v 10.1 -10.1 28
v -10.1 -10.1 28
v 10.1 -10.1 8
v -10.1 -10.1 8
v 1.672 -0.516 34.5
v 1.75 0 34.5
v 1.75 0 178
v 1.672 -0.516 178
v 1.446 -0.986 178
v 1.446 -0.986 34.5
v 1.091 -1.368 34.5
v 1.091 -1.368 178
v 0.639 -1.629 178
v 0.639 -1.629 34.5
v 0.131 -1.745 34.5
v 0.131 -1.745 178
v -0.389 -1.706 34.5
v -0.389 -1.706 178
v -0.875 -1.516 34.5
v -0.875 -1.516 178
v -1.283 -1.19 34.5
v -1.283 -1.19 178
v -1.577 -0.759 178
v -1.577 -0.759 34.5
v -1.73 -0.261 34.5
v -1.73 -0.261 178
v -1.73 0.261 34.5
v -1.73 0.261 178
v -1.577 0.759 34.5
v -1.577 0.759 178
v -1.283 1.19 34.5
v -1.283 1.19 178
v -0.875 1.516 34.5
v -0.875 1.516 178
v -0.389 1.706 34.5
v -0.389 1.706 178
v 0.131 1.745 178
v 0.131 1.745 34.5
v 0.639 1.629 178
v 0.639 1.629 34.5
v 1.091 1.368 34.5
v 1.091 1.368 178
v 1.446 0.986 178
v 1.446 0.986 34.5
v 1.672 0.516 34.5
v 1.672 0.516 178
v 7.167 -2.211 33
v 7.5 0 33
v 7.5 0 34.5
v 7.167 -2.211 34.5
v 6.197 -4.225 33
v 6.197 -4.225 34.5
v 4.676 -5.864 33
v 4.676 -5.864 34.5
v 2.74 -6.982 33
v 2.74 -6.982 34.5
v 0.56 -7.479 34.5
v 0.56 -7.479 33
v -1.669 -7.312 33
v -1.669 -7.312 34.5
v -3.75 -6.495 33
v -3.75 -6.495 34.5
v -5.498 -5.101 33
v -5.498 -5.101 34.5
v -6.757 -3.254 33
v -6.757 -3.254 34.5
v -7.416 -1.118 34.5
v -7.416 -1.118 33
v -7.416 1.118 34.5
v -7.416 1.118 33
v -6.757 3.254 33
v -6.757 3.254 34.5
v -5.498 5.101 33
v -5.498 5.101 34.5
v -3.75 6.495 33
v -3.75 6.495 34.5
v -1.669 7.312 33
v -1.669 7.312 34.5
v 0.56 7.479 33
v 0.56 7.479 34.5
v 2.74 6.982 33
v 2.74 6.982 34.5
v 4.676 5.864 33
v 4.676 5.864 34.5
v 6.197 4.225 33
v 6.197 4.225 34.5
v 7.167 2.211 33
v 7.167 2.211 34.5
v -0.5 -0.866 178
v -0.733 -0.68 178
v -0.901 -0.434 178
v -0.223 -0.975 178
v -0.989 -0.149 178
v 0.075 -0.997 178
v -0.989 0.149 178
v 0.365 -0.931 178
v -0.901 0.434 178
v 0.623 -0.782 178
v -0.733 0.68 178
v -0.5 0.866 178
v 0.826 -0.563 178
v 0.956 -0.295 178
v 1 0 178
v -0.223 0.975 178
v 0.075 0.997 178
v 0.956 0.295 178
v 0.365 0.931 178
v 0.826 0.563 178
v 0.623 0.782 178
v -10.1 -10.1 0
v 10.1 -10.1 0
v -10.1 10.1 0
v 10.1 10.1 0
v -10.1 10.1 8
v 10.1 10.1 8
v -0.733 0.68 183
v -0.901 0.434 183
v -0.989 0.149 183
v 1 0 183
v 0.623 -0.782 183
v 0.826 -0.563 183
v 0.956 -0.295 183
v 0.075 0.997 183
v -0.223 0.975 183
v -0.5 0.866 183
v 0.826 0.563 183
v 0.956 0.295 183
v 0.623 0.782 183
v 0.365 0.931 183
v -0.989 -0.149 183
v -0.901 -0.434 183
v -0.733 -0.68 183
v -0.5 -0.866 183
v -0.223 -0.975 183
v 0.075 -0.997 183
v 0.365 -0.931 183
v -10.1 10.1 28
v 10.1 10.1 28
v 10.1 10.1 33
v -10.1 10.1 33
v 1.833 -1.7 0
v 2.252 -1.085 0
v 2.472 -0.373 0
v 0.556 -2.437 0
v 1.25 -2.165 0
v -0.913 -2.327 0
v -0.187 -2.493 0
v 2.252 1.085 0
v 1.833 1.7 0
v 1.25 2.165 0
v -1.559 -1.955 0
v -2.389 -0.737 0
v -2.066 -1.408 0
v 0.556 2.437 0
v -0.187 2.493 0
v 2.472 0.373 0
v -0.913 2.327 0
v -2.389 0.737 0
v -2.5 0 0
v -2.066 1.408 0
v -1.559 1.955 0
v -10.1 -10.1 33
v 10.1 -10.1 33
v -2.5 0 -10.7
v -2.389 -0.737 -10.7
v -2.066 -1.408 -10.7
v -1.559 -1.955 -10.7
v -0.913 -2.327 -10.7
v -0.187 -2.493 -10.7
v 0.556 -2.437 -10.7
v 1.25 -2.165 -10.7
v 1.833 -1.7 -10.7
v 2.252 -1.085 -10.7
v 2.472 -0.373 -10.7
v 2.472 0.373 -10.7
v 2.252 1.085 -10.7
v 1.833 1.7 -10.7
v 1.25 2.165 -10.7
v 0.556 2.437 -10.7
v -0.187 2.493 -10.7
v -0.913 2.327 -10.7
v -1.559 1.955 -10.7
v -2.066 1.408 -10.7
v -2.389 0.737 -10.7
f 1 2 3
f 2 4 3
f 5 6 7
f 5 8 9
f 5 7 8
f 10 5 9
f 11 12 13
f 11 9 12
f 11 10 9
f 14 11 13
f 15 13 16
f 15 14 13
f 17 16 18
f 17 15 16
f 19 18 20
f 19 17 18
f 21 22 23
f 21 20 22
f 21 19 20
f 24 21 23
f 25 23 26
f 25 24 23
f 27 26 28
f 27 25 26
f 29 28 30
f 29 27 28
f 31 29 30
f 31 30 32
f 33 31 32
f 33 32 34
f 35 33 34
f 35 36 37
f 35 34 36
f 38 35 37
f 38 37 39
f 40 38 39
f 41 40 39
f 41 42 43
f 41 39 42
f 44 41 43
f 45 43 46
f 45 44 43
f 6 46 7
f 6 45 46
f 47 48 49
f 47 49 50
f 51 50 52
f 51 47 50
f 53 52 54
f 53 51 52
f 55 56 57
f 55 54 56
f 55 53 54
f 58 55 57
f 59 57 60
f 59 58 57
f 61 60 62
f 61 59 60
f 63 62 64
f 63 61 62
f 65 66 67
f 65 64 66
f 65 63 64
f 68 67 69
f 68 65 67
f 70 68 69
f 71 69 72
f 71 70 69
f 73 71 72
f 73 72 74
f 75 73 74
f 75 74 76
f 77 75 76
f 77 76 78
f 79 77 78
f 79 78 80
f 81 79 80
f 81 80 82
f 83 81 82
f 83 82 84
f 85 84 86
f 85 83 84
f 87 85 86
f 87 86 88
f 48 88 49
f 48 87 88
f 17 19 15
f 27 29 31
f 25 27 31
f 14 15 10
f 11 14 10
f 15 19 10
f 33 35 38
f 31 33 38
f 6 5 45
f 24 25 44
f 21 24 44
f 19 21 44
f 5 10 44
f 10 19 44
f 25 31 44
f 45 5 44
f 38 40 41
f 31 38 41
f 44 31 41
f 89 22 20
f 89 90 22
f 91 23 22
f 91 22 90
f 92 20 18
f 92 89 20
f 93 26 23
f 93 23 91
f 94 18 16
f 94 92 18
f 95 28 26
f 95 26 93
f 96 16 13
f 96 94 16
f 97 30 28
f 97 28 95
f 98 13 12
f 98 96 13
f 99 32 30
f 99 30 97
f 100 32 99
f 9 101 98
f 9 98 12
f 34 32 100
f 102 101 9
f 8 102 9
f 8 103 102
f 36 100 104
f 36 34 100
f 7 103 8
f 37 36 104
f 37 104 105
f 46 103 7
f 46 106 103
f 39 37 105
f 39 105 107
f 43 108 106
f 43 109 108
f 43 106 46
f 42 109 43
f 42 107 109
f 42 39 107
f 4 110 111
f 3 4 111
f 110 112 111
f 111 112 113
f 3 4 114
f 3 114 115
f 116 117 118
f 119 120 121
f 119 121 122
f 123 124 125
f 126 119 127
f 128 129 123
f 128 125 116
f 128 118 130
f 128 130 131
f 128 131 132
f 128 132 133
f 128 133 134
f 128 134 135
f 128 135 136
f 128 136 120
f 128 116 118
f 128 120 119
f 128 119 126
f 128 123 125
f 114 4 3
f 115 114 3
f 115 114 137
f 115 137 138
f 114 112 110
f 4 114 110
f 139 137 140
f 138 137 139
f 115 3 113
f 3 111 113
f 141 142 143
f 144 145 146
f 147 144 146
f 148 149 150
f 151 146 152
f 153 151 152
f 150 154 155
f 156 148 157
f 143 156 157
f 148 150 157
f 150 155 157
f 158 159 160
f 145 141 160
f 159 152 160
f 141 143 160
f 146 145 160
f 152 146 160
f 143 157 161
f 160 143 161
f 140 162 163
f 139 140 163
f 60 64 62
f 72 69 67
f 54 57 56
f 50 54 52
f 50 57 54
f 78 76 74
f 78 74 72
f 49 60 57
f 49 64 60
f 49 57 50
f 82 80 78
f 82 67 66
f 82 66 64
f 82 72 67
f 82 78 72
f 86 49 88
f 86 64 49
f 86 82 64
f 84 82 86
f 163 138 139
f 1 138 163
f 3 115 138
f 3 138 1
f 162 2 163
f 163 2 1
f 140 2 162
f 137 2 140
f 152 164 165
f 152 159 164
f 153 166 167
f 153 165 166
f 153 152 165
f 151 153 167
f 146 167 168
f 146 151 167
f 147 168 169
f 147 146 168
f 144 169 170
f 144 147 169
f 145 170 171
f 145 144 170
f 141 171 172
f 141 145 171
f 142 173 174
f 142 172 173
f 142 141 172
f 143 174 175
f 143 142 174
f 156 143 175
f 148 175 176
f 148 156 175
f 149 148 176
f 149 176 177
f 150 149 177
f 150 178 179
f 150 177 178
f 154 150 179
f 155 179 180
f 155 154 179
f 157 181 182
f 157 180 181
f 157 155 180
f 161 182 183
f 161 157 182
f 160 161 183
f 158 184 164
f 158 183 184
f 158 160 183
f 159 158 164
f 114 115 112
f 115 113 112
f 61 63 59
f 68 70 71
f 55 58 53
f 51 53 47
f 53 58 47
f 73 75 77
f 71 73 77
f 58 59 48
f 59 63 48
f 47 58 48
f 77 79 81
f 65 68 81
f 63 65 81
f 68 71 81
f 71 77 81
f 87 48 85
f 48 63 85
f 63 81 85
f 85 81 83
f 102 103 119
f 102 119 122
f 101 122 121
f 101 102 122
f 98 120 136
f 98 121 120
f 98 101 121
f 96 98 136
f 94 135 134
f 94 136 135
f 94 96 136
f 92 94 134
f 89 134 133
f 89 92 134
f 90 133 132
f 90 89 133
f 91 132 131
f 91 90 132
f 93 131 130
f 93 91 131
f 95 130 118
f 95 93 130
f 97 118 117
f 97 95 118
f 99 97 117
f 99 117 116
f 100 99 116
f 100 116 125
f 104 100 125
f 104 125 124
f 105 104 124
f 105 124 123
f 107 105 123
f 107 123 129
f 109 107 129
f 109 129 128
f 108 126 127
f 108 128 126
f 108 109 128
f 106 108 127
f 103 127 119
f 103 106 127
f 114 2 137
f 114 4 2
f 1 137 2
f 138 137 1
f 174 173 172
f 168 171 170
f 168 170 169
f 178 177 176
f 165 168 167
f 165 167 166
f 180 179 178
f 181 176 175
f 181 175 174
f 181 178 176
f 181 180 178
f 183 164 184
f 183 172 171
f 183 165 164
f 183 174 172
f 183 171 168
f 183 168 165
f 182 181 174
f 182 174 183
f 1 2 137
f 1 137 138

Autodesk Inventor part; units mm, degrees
ref_plane "YZ Plane" through (0, 0, 0) normal (1, 0, 0) x (0, 1, 0)
ref_plane "XZ Plane" through (0, 0, 0) normal (0, 1, 0) x (-1, 0, 0)
ref_plane "XY Plane" through (0, 0, 0) normal (0, 0, 1) x (1, 0, 0)
sketch "Sketch1" plane through (0, 0, 0) normal (0, 0, 1) x (1, 0, 0)
  line L0 (-14.14, 0) -> (14.14, 0) projected
  line L1 (0, -14.14) -> (0, 14.14) projected
  line L2 (10.1, 10.1) -> (-10.1, 10.1)
  line L3 (-10.1, 10.1) -> (-10.1, -10.1)
  line L4 (-10.1, -10.1) -> (10.1, -10.1)
  line L5 (10.1, -10.1) -> (10.1, 10.1)
  line L6 (10.1, 10.1) -> (-10.1, -10.1) construction
  line L7 (-10.1, 10.1) -> (10.1, -10.1) construction
  point P0 (0, 0)
  dimension "d0" = 20.2
  dimension "d1" = 20.2
extrude "Extrusion3" add sketch "Sketch1" along normal blind 8
sketch "Sketch3" plane through (0, 0, 8) normal (0, 0, 1) x (1, 0, 0)
  line L0 (-10.1, -10.1) -> (10.1, -10.1) projected
  line L1 (-10.1, 10.1) -> (10.1, 10.1)
  line L2 (10.1, 10.1) -> (10.1, -10.1)
  line L3 (10.1, -10.1) -> (-10.1, -10.1)
  line L4 (-10.1, -10.1) -> (-10.1, 10.1)
  line L5 (-10.1, 10.1) -> (10.1, -10.1) construction
  line L6 (10.1, 10.1) -> (-10.1, -10.1) construction
  point P0 (0, 0)
extrude "Extrusion4" add sketch "Sketch3" along normal blind 20 separate body
sketch "Sketch4" plane through (0, 0, 28) normal (0, 0, 1) x (1, 0, 0)
  line L0 (-10.1, -10.1) -> (10.1, -10.1) projected
  line L1 (-10.1, 10.1) -> (10.1, 10.1)
  line L2 (10.1, 10.1) -> (10.1, -10.1)
  line L3 (10.1, -10.1) -> (-10.1, -10.1)
  line L4 (-10.1, -10.1) -> (-10.1, 10.1)
  line L5 (-10.1, 10.1) -> (10.1, -10.1) construction
  line L6 (10.1, 10.1) -> (-10.1, -10.1) construction
  point P0 (0, 0)
extrude "Extrusion5" add sketch "Sketch4" along normal blind 5 separate body
sketch "Sketch5" plane through (0, 0, 33) normal (0, 0, 1) x (1, 0, 0)
  circle A0 centre (0, 0) radius 7.5
  dimension "d12" = 15
extrude "Extrusion6" add sketch "Sketch5" along normal blind 1.5 separate body
sketch "Sketch6" plane through (0, 0, 0) normal (0, 0, -1) x (-1, 0, 0)
  circle A0 centre (0, 0) radius 2.5
  dimension "d15" = 5
extrude "Extrusion7" add sketch "Sketch6" along normal blind 10.7 separate body
sketch "Sketch7" plane through (0, 0, 34.5) normal (0, 0, 1) x (1, 0, 0)
  circle A0 centre (0, 0) radius 1.75
  dimension "d18" = 3.5
extrude "Extrusion8" add sketch "Sketch7" along normal blind 143.5 separate body
sketch "Sketch8" plane through (0, 0, 178) normal (0, 0, 1) x (1, 0, 0)
  circle A0 centre (0, 0) radius 1
  dimension "d21" = 2
extrude "Extrusion9" add sketch "Sketch8" along normal blind 5 bodies 6
properties part number "maly_silnik"
